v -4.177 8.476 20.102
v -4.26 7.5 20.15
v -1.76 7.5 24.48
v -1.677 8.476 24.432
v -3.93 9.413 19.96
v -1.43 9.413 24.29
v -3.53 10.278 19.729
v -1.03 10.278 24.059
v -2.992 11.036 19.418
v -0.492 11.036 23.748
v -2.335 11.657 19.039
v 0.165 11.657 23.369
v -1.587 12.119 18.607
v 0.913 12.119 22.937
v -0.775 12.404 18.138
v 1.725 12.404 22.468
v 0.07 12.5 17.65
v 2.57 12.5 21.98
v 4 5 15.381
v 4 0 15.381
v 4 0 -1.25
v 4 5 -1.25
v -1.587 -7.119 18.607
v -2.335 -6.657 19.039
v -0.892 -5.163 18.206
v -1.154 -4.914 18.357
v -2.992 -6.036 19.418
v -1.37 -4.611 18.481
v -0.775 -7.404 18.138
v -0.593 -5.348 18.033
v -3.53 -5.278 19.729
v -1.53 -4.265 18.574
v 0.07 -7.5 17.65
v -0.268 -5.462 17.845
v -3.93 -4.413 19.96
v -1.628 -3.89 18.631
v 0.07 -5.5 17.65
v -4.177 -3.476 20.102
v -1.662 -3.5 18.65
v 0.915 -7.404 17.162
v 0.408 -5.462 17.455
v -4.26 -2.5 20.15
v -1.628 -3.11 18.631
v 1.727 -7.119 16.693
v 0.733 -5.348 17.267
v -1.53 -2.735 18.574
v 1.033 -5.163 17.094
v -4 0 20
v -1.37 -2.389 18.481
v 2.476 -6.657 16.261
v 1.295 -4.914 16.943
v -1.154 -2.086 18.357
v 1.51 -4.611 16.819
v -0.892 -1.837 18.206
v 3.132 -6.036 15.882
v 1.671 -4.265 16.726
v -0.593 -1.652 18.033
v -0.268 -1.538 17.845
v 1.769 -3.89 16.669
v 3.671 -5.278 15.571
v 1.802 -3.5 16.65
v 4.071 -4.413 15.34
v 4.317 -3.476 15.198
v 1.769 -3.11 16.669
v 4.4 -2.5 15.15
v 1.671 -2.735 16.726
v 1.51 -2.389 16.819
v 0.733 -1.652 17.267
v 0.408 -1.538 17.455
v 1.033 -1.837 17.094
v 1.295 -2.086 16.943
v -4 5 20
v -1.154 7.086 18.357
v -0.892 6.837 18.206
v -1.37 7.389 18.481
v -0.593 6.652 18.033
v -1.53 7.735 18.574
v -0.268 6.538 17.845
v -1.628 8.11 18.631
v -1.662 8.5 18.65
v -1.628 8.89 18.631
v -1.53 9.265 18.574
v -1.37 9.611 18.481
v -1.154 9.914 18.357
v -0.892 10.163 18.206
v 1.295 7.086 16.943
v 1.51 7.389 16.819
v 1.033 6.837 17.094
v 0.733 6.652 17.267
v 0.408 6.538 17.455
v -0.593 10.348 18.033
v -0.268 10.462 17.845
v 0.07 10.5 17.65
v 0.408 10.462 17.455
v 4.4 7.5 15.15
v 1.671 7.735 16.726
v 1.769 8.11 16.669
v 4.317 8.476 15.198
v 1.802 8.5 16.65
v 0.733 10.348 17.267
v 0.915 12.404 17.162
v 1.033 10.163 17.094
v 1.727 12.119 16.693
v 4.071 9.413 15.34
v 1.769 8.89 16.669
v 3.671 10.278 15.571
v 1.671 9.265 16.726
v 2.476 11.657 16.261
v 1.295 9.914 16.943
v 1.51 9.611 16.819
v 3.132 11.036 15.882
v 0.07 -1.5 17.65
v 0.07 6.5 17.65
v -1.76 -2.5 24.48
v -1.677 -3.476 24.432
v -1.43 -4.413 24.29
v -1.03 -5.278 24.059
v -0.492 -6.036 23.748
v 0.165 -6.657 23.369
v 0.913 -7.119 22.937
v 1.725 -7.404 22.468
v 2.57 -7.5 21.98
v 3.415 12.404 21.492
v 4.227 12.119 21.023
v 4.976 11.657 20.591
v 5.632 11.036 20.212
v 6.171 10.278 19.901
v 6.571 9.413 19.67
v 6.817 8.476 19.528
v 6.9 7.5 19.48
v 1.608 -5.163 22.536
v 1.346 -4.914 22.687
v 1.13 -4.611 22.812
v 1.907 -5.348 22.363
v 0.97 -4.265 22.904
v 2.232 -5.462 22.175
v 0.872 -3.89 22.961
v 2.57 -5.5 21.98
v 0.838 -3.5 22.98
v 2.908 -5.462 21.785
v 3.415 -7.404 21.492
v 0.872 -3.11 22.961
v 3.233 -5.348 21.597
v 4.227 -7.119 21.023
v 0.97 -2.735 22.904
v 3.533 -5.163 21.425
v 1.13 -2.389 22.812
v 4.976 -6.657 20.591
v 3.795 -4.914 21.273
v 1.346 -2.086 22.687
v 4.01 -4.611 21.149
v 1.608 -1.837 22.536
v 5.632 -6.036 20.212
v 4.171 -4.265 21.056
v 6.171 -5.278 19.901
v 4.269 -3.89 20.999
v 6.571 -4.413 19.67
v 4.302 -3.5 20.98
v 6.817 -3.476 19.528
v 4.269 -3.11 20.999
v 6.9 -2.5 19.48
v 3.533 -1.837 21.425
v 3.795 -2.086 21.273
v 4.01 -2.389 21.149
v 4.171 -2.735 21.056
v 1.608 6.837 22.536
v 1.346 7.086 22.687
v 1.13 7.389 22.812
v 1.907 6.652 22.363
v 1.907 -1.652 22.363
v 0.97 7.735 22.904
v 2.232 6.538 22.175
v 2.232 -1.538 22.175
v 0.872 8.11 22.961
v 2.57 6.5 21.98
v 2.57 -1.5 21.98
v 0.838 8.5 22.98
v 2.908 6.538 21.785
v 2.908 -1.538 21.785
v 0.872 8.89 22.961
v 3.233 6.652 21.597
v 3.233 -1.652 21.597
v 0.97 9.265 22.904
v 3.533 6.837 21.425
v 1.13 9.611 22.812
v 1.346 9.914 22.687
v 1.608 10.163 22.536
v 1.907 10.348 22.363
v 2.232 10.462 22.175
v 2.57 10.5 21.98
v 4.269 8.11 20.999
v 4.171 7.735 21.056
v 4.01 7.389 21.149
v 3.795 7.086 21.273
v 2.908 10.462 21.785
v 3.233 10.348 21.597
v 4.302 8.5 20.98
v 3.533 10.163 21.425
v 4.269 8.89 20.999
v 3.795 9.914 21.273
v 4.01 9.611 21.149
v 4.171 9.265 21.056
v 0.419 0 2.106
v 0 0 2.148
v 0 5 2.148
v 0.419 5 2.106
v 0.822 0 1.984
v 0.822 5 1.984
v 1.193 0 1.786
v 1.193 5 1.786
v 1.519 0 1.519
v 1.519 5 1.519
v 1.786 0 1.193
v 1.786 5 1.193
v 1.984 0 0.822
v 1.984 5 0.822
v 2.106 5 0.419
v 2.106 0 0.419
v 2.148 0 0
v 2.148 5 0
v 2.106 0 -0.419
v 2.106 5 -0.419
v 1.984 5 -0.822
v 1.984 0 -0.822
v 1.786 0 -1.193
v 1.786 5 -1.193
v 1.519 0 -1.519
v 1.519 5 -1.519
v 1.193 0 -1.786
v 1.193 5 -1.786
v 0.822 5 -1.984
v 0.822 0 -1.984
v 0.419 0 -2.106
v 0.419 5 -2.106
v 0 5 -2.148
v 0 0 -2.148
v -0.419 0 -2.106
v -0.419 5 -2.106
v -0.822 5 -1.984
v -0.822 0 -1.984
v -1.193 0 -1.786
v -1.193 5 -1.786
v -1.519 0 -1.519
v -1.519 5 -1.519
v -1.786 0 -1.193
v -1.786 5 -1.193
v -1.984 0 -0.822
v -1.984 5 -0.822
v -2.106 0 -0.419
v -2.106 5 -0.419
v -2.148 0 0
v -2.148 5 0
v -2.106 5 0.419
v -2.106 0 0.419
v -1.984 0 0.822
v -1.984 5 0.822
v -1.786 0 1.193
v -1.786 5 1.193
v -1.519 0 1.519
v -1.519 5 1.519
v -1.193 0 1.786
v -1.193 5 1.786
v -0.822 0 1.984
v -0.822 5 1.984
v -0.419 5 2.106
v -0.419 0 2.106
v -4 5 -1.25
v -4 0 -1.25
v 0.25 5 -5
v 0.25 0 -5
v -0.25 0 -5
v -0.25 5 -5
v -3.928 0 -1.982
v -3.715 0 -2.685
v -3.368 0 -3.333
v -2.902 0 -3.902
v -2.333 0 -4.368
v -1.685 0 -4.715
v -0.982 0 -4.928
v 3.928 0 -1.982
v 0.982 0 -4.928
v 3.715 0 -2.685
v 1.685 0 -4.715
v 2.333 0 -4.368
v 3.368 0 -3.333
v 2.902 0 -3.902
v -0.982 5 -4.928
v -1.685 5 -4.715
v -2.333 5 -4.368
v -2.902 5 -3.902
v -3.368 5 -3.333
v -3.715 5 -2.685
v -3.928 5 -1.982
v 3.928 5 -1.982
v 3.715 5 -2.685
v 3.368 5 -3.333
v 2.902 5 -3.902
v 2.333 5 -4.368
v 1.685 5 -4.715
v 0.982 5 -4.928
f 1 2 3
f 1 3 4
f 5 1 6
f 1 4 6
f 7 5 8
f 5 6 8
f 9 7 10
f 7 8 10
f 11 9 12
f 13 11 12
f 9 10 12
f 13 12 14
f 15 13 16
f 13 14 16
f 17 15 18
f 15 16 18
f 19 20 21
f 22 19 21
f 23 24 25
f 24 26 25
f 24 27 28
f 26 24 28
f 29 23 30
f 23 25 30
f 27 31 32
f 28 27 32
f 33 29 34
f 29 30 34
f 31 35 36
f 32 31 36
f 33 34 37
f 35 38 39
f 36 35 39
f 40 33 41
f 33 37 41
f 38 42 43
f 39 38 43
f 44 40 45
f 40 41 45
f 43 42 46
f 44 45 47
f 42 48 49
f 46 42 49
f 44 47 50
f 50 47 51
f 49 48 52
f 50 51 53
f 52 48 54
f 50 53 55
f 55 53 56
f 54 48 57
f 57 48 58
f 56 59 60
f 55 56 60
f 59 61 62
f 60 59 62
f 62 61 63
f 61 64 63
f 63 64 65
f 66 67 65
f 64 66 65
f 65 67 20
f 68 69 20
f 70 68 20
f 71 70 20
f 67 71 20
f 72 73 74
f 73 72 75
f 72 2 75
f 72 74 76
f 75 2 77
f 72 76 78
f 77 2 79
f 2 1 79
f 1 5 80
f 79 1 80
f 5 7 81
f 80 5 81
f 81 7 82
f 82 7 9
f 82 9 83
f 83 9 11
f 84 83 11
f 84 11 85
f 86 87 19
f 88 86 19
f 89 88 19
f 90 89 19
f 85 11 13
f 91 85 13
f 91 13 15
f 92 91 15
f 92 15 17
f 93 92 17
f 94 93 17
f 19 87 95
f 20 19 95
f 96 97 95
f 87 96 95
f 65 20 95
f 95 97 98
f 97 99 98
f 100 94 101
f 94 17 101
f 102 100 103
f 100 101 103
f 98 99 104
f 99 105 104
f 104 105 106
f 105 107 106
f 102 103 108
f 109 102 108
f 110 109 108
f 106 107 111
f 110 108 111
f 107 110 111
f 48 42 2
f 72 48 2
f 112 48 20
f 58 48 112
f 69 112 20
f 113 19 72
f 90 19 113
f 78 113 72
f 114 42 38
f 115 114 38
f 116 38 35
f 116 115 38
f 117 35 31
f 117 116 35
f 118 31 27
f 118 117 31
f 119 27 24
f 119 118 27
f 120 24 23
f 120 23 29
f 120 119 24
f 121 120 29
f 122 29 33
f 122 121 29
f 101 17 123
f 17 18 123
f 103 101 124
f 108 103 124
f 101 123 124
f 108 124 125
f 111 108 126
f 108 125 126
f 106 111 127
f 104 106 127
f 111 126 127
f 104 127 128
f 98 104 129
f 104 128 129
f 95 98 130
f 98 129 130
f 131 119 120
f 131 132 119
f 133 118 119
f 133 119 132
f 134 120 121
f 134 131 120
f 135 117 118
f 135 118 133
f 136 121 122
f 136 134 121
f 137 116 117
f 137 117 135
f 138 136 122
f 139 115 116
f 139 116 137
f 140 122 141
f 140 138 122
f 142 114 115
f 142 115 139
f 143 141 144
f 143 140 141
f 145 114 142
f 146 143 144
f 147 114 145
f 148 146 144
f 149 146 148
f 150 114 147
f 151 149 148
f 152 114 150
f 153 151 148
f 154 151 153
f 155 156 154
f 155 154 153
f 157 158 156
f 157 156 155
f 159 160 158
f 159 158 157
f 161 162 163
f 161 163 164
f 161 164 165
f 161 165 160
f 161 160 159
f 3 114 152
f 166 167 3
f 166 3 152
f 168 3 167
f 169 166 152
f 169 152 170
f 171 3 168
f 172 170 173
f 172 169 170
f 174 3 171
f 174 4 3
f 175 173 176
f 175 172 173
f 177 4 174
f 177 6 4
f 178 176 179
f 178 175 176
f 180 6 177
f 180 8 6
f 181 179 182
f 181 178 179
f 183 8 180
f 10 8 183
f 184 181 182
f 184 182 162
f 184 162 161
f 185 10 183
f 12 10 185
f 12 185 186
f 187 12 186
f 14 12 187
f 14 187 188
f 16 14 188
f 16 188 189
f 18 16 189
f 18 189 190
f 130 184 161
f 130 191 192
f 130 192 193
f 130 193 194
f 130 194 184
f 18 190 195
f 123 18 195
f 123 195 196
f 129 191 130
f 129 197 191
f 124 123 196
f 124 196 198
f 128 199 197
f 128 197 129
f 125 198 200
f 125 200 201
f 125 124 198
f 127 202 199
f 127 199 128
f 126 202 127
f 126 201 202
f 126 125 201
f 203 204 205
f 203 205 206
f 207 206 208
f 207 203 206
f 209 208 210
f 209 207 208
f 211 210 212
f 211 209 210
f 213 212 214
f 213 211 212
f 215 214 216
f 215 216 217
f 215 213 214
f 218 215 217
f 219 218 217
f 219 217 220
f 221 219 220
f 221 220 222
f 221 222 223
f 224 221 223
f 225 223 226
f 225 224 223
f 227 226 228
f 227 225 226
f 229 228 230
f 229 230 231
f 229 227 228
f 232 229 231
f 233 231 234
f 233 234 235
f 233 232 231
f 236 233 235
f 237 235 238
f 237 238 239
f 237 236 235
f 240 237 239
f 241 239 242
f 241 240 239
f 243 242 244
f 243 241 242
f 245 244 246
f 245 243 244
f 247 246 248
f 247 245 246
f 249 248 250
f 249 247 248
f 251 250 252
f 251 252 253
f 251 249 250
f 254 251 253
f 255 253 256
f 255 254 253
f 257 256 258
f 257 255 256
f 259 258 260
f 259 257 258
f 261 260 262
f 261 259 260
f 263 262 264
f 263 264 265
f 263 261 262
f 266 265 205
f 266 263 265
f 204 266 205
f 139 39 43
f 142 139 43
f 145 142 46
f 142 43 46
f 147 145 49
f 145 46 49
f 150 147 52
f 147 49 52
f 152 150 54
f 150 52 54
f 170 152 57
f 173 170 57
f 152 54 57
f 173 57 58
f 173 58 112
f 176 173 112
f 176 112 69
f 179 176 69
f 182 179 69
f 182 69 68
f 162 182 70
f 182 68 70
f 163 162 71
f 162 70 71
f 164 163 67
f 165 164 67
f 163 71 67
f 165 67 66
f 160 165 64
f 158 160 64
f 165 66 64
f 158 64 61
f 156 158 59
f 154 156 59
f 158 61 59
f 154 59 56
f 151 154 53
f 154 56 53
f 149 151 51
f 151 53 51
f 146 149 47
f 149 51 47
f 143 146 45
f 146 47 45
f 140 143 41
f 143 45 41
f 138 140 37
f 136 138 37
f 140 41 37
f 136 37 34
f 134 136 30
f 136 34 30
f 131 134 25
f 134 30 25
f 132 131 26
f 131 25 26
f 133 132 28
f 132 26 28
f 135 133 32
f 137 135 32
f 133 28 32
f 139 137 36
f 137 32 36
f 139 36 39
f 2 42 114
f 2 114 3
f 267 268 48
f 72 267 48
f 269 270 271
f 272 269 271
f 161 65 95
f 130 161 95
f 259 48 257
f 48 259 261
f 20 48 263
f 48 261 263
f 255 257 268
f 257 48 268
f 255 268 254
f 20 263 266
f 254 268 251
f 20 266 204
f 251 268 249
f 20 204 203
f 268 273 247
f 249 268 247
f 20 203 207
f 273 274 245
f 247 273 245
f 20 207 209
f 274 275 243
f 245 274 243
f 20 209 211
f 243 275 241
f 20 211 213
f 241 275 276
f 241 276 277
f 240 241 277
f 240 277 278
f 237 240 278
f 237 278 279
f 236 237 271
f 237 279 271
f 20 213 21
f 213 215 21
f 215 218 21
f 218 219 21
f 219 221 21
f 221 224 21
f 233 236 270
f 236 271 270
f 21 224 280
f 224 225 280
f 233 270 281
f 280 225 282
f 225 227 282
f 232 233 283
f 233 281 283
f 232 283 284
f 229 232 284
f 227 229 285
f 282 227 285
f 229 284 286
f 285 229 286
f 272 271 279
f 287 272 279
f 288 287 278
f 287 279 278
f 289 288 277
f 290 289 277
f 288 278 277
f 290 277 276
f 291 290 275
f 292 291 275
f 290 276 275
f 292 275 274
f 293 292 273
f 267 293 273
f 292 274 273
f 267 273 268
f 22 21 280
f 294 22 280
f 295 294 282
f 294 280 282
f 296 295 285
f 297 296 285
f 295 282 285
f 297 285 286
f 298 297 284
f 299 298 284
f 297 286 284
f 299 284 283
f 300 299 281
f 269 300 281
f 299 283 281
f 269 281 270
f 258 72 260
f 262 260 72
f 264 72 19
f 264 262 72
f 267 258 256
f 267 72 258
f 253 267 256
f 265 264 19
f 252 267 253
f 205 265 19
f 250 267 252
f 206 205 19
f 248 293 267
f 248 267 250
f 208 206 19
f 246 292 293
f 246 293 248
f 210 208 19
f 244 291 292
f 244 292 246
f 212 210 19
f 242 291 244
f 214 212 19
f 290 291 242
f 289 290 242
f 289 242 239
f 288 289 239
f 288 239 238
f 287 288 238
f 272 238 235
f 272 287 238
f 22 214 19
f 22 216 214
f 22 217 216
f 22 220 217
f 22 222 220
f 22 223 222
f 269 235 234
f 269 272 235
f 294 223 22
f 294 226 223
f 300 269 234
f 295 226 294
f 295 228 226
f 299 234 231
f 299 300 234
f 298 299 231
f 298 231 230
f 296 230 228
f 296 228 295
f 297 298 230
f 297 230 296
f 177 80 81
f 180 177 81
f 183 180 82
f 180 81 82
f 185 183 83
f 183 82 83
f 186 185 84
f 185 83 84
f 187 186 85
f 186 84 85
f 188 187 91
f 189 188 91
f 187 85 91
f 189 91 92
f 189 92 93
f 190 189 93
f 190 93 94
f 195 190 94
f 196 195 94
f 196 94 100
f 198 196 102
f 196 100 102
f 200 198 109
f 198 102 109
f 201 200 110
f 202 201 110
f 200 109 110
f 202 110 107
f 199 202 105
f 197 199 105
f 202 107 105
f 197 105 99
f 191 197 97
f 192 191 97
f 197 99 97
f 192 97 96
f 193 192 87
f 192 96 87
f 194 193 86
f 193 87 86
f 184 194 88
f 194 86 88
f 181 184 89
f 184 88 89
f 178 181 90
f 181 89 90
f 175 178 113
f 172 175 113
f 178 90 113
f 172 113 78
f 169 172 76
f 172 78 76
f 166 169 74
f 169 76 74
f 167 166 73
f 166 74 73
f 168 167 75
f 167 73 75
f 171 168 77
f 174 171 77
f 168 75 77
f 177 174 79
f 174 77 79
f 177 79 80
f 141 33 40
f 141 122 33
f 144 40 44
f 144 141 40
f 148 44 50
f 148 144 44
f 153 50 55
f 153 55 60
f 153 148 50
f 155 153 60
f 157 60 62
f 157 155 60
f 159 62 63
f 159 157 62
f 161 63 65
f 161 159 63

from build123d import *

# Parameters (mm, degrees)
SKETCH1_R           = 2.147718393
BOSS_EXTRUDE1_DEPTH = 5
SKETCH2_W           = 10
SKETCH2_H           = 20
BOSS_EXTRUDE2_DEPTH = 5
SKETCH3_R           = 2
CUT_EXTRUDE1_DEPTH  = 5
FILLET1_R           = 5


with BuildPart() as part:
    # Sketch1 → Boss-Extrude1 (new body)
    with BuildSketch(Plane(origin=(0, 0, 0), x_dir=(1, 0, 0), z_dir=(0, 1, 0))):
        with BuildLine():
            Line((-4, -20), (4, -15.381197846))
            Line((4, -15.381197846), (4, -5))
            Line((4, -5), (4, 1.25))
            ThreePointArc((4, 1.25), (2.901650429, 3.901650429), (0.25, 5))
            Line((0.25, 5), (-0.25, 5))
            ThreePointArc((-0.25, 5), (-2.901650429, 3.901650429), (-4, 1.25))
            Line((-4, 1.25), (-4, -5))
            Line((-4, -5), (-4, -20))
        make_face()
        with Locations(Location((0, 0, 0), (0, 0, 270))):
            Circle(SKETCH1_R, mode=Mode.SUBTRACT)
    extrude(amount=BOSS_EXTRUDE1_DEPTH)

    # Sketch2 → Boss-Extrude2 (add)
    with BuildSketch(Plane(origin=(7.660254038, 0, 13.267949192), x_dir=(0.8660254037844382, 0, -0.500000000000001), z_dir=(0.5000000000000009, 0, 0.866025403784438))):
        with Locations((-8.764101615, 2.5)):
            Rectangle(SKETCH2_W, SKETCH2_H)
    extrude(amount=BOSS_EXTRUDE2_DEPTH)

    # Sketch3 → Cut-Extrude1 (cut)
    with BuildSketch(Plane(origin=(7.660254038, 0, 13.267949192), x_dir=(-0.8660254037844382, 0, 0.5000000000000009), z_dir=(-0.5000000000000009, 0, -0.8660254037844383))):
        with Locations((8.764101615, -3.5)):
            Circle(SKETCH3_R)
        with Locations((8.764101615, 8.5)):
            Circle(SKETCH3_R)
    extrude(amount=-CUT_EXTRUDE1_DEPTH, mode=Mode.SUBTRACT)

    # Fillet1
    fillet1_edges = [part.edges().sort_by_distance(p)[0] for p in [
        (5.650446417, 12.5, 17.315063509),
        (-3.009807621, 12.5, 22.315063509),
        (5.650446417, -7.5, 17.315063509),
        (-3.009807621, -7.5, 22.315063509),
    ]]
    fillet(fillet1_edges, radius=FILLET1_R - 0.0001)  # a hair under: the kernel refuses the full size


solid = part.part
